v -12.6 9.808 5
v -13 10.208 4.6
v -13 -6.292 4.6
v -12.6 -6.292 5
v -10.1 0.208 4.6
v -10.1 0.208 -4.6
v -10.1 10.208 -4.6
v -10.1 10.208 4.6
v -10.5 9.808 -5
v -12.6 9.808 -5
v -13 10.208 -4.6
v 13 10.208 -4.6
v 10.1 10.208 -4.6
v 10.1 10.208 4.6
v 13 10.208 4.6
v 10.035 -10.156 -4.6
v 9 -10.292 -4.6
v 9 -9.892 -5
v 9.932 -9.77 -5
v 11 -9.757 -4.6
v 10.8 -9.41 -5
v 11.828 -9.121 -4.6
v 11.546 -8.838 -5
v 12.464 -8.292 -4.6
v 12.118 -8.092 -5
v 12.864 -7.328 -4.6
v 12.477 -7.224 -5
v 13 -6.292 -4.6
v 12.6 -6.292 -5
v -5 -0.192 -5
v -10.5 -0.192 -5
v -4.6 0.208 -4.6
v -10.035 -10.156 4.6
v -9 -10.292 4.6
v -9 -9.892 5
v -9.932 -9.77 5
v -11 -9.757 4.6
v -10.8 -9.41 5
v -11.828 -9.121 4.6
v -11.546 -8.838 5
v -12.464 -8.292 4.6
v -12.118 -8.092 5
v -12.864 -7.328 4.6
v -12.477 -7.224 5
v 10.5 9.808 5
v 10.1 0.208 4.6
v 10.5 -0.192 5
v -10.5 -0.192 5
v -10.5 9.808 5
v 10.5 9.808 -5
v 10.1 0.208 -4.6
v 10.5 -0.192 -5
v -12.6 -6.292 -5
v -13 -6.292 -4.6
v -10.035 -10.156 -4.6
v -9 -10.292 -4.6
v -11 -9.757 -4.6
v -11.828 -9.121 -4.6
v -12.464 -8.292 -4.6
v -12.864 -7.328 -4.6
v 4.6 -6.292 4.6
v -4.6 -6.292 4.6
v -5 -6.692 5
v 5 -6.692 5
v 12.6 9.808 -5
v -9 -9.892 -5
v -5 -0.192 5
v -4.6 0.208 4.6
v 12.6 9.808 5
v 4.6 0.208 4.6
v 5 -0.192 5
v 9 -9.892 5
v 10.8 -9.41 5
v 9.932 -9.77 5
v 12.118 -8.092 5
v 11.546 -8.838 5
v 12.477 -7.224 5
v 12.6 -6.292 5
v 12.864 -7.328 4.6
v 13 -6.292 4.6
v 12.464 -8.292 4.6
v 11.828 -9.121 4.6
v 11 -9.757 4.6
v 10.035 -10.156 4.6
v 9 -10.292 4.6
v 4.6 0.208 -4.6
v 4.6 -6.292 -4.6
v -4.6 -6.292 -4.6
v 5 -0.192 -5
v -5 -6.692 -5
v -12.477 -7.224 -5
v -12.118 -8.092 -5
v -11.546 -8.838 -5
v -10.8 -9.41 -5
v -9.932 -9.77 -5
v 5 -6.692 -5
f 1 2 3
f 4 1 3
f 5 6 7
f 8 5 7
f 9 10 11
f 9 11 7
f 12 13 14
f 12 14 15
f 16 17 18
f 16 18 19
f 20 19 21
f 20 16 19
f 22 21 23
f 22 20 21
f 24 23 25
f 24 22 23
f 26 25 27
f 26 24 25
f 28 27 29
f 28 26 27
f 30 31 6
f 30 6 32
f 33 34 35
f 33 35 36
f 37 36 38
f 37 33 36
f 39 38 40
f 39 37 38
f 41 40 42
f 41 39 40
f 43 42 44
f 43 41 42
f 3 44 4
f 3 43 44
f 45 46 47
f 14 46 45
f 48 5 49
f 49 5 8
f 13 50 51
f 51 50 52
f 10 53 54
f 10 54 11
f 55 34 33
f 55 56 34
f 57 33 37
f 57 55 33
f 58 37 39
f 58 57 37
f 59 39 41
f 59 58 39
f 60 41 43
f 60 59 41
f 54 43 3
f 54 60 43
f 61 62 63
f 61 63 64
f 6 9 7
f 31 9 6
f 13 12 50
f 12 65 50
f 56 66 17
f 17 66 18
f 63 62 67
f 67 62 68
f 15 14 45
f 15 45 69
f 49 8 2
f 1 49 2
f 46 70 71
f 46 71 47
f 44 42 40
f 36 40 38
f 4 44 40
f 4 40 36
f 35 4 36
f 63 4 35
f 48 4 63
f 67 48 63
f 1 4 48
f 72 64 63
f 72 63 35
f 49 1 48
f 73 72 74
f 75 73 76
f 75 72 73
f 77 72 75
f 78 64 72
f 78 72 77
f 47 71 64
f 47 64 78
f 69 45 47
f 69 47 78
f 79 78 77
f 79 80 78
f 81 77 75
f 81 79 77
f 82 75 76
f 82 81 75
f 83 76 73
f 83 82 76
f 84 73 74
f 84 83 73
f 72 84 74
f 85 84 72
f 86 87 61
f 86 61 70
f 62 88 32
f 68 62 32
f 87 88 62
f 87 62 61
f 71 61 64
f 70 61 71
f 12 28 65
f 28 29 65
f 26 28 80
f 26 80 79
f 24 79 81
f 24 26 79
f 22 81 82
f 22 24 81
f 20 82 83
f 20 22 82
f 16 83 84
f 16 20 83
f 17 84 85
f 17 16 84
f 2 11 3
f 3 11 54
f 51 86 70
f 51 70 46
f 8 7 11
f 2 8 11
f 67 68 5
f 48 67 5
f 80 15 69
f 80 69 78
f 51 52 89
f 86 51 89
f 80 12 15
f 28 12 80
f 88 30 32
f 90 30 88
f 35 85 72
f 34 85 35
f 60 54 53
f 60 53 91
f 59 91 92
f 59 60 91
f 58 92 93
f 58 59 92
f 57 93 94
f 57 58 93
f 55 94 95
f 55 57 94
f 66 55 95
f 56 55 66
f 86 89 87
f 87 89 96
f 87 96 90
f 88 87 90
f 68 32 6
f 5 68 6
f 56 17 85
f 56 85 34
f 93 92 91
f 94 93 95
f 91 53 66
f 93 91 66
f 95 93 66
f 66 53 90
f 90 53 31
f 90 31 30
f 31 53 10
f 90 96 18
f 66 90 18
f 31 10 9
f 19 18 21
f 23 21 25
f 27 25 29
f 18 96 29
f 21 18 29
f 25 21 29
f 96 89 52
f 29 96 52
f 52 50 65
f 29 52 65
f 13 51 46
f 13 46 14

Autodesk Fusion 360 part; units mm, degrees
sketch "Sketch1" plane through (0, 0, 0) normal (0, 0, 1) x (1, 0, 0) in component "rail_installation_guide_center_x2"
  line L0 (0, -6.2924) -> (-4.6, -6.2924)
  line L1 (-4.6, -6.2924) -> (-4.6, 0.2076)
  line L2 (-4.6, 0.2076) -> (-10.1, 0.2076)
  line L3 (-10.1, 0.2076) -> (-10.1, 10.2076)
  line L4 (-10.1, 10.2076) -> (-13, 10.2076)
  line L5 (-13, 10.2076) -> (-13, -10.2924)
  line L6 (-13, -10.2924) -> (0, -10.2924)
  line L7 (0, -13) -> (0, 13) construction
  line L8 (0, -6.2924) -> (4.6, -6.2924)
  line L9 (4.6, -6.2924) -> (4.6, 0.2076)
  line L10 (4.6, 0.2076) -> (10.1, 0.2076)
  line L11 (10.1, 0.2076) -> (10.1, 10.2076)
  line L12 (10.1, 10.2076) -> (13, 10.2076)
  line L13 (13, 10.2076) -> (13, -10.2924)
  line L14 (13, -10.2924) -> (0, -10.2924)
  dimension "d9" = 4.6
  dimension "d10" = 6.5
  dimension "d11" = 10
  dimension "d13" = 2.9
  dimension "d14" = 4
  dimension "d15" = 10.1
extrude "Extrude1" add sketch "Sketch1" along normal mid plane 10 in component "rail_installation_guide_center_x2"
fillet "Fillet1" radius 4 2 edges at (-13, -10.2924, 0) (13, -10.2924, 0) in component "rail_installation_guide_center_x2"
chamfer "Chamfer1" distance 0.4 angle 45 28 edges at (-13, 1.9576, 5) (-11.8284, -9.1208, 5) (0, -10.2924, 5) (11.8284, -9.1208, 5) (13, 1.9576, 5) (-11.55, 10.2076, 5) (-10.1, 5.2076, 5) (-7.35, 0.2076, 5) (-4.6, -3.0424, 5) (0, -6.2924, 5) (4.6, -3.0424, 5) (7.35, 0.2076, 5) (10.1, 5.2076, 5) (11.55, 10.2076, 5) (11.55, 10.2076, -5) (13, 1.9576, -5) (11.8284, -9.1208, -5) (0, -10.2924, -5) (-11.8284, -9.1208, -5) (-13, 1.9576, -5) (-11.55, 10.2076, -5) (-10.1, 5.2076, -5) (-7.35, 0.2076, -5) (-4.6, -3.0424, -5) (0, -6.2924, -5) (4.6, -3.0424, -5) (7.35, 0.2076, -5) (10.1, 5.2076, -5) in component "rail_installation_guide_center_x2"
component "rail_installation_guide_center_x2" placed x (1, 0, 0) y (0, 1, 0) z (0, 0, 1) at (0, 0, 0)
equation "rail_width = 9.0 mm"
equation "tolerance = 0.2 mm"
equation "extrusion_width = 20.00 mm"
equation "arm_length = 10 mm"
equation "rail_depth = 6.5 mm"
equation "tool_thickness = 4 mm"
equation "corner_fillet = 4 mm"
equation "chamfer = 0.4 mm"
equation "d9 = ( rail_width + tolerance ) / 2"
equation "d10 = rail_depth"
equation "d11 = arm_length"
equation "arm_width = 2.9 mm"
equation "d13 = arm_width"
equation "d14 = tool_thickness"
equation "d15 = ( extrusion_width + tolerance ) / 2"
equation "d16 = tool_width / 2"
equation "tool_width = 10 mm"
equation "d20 = corner_fillet"
equation "d21 = chamfer"
